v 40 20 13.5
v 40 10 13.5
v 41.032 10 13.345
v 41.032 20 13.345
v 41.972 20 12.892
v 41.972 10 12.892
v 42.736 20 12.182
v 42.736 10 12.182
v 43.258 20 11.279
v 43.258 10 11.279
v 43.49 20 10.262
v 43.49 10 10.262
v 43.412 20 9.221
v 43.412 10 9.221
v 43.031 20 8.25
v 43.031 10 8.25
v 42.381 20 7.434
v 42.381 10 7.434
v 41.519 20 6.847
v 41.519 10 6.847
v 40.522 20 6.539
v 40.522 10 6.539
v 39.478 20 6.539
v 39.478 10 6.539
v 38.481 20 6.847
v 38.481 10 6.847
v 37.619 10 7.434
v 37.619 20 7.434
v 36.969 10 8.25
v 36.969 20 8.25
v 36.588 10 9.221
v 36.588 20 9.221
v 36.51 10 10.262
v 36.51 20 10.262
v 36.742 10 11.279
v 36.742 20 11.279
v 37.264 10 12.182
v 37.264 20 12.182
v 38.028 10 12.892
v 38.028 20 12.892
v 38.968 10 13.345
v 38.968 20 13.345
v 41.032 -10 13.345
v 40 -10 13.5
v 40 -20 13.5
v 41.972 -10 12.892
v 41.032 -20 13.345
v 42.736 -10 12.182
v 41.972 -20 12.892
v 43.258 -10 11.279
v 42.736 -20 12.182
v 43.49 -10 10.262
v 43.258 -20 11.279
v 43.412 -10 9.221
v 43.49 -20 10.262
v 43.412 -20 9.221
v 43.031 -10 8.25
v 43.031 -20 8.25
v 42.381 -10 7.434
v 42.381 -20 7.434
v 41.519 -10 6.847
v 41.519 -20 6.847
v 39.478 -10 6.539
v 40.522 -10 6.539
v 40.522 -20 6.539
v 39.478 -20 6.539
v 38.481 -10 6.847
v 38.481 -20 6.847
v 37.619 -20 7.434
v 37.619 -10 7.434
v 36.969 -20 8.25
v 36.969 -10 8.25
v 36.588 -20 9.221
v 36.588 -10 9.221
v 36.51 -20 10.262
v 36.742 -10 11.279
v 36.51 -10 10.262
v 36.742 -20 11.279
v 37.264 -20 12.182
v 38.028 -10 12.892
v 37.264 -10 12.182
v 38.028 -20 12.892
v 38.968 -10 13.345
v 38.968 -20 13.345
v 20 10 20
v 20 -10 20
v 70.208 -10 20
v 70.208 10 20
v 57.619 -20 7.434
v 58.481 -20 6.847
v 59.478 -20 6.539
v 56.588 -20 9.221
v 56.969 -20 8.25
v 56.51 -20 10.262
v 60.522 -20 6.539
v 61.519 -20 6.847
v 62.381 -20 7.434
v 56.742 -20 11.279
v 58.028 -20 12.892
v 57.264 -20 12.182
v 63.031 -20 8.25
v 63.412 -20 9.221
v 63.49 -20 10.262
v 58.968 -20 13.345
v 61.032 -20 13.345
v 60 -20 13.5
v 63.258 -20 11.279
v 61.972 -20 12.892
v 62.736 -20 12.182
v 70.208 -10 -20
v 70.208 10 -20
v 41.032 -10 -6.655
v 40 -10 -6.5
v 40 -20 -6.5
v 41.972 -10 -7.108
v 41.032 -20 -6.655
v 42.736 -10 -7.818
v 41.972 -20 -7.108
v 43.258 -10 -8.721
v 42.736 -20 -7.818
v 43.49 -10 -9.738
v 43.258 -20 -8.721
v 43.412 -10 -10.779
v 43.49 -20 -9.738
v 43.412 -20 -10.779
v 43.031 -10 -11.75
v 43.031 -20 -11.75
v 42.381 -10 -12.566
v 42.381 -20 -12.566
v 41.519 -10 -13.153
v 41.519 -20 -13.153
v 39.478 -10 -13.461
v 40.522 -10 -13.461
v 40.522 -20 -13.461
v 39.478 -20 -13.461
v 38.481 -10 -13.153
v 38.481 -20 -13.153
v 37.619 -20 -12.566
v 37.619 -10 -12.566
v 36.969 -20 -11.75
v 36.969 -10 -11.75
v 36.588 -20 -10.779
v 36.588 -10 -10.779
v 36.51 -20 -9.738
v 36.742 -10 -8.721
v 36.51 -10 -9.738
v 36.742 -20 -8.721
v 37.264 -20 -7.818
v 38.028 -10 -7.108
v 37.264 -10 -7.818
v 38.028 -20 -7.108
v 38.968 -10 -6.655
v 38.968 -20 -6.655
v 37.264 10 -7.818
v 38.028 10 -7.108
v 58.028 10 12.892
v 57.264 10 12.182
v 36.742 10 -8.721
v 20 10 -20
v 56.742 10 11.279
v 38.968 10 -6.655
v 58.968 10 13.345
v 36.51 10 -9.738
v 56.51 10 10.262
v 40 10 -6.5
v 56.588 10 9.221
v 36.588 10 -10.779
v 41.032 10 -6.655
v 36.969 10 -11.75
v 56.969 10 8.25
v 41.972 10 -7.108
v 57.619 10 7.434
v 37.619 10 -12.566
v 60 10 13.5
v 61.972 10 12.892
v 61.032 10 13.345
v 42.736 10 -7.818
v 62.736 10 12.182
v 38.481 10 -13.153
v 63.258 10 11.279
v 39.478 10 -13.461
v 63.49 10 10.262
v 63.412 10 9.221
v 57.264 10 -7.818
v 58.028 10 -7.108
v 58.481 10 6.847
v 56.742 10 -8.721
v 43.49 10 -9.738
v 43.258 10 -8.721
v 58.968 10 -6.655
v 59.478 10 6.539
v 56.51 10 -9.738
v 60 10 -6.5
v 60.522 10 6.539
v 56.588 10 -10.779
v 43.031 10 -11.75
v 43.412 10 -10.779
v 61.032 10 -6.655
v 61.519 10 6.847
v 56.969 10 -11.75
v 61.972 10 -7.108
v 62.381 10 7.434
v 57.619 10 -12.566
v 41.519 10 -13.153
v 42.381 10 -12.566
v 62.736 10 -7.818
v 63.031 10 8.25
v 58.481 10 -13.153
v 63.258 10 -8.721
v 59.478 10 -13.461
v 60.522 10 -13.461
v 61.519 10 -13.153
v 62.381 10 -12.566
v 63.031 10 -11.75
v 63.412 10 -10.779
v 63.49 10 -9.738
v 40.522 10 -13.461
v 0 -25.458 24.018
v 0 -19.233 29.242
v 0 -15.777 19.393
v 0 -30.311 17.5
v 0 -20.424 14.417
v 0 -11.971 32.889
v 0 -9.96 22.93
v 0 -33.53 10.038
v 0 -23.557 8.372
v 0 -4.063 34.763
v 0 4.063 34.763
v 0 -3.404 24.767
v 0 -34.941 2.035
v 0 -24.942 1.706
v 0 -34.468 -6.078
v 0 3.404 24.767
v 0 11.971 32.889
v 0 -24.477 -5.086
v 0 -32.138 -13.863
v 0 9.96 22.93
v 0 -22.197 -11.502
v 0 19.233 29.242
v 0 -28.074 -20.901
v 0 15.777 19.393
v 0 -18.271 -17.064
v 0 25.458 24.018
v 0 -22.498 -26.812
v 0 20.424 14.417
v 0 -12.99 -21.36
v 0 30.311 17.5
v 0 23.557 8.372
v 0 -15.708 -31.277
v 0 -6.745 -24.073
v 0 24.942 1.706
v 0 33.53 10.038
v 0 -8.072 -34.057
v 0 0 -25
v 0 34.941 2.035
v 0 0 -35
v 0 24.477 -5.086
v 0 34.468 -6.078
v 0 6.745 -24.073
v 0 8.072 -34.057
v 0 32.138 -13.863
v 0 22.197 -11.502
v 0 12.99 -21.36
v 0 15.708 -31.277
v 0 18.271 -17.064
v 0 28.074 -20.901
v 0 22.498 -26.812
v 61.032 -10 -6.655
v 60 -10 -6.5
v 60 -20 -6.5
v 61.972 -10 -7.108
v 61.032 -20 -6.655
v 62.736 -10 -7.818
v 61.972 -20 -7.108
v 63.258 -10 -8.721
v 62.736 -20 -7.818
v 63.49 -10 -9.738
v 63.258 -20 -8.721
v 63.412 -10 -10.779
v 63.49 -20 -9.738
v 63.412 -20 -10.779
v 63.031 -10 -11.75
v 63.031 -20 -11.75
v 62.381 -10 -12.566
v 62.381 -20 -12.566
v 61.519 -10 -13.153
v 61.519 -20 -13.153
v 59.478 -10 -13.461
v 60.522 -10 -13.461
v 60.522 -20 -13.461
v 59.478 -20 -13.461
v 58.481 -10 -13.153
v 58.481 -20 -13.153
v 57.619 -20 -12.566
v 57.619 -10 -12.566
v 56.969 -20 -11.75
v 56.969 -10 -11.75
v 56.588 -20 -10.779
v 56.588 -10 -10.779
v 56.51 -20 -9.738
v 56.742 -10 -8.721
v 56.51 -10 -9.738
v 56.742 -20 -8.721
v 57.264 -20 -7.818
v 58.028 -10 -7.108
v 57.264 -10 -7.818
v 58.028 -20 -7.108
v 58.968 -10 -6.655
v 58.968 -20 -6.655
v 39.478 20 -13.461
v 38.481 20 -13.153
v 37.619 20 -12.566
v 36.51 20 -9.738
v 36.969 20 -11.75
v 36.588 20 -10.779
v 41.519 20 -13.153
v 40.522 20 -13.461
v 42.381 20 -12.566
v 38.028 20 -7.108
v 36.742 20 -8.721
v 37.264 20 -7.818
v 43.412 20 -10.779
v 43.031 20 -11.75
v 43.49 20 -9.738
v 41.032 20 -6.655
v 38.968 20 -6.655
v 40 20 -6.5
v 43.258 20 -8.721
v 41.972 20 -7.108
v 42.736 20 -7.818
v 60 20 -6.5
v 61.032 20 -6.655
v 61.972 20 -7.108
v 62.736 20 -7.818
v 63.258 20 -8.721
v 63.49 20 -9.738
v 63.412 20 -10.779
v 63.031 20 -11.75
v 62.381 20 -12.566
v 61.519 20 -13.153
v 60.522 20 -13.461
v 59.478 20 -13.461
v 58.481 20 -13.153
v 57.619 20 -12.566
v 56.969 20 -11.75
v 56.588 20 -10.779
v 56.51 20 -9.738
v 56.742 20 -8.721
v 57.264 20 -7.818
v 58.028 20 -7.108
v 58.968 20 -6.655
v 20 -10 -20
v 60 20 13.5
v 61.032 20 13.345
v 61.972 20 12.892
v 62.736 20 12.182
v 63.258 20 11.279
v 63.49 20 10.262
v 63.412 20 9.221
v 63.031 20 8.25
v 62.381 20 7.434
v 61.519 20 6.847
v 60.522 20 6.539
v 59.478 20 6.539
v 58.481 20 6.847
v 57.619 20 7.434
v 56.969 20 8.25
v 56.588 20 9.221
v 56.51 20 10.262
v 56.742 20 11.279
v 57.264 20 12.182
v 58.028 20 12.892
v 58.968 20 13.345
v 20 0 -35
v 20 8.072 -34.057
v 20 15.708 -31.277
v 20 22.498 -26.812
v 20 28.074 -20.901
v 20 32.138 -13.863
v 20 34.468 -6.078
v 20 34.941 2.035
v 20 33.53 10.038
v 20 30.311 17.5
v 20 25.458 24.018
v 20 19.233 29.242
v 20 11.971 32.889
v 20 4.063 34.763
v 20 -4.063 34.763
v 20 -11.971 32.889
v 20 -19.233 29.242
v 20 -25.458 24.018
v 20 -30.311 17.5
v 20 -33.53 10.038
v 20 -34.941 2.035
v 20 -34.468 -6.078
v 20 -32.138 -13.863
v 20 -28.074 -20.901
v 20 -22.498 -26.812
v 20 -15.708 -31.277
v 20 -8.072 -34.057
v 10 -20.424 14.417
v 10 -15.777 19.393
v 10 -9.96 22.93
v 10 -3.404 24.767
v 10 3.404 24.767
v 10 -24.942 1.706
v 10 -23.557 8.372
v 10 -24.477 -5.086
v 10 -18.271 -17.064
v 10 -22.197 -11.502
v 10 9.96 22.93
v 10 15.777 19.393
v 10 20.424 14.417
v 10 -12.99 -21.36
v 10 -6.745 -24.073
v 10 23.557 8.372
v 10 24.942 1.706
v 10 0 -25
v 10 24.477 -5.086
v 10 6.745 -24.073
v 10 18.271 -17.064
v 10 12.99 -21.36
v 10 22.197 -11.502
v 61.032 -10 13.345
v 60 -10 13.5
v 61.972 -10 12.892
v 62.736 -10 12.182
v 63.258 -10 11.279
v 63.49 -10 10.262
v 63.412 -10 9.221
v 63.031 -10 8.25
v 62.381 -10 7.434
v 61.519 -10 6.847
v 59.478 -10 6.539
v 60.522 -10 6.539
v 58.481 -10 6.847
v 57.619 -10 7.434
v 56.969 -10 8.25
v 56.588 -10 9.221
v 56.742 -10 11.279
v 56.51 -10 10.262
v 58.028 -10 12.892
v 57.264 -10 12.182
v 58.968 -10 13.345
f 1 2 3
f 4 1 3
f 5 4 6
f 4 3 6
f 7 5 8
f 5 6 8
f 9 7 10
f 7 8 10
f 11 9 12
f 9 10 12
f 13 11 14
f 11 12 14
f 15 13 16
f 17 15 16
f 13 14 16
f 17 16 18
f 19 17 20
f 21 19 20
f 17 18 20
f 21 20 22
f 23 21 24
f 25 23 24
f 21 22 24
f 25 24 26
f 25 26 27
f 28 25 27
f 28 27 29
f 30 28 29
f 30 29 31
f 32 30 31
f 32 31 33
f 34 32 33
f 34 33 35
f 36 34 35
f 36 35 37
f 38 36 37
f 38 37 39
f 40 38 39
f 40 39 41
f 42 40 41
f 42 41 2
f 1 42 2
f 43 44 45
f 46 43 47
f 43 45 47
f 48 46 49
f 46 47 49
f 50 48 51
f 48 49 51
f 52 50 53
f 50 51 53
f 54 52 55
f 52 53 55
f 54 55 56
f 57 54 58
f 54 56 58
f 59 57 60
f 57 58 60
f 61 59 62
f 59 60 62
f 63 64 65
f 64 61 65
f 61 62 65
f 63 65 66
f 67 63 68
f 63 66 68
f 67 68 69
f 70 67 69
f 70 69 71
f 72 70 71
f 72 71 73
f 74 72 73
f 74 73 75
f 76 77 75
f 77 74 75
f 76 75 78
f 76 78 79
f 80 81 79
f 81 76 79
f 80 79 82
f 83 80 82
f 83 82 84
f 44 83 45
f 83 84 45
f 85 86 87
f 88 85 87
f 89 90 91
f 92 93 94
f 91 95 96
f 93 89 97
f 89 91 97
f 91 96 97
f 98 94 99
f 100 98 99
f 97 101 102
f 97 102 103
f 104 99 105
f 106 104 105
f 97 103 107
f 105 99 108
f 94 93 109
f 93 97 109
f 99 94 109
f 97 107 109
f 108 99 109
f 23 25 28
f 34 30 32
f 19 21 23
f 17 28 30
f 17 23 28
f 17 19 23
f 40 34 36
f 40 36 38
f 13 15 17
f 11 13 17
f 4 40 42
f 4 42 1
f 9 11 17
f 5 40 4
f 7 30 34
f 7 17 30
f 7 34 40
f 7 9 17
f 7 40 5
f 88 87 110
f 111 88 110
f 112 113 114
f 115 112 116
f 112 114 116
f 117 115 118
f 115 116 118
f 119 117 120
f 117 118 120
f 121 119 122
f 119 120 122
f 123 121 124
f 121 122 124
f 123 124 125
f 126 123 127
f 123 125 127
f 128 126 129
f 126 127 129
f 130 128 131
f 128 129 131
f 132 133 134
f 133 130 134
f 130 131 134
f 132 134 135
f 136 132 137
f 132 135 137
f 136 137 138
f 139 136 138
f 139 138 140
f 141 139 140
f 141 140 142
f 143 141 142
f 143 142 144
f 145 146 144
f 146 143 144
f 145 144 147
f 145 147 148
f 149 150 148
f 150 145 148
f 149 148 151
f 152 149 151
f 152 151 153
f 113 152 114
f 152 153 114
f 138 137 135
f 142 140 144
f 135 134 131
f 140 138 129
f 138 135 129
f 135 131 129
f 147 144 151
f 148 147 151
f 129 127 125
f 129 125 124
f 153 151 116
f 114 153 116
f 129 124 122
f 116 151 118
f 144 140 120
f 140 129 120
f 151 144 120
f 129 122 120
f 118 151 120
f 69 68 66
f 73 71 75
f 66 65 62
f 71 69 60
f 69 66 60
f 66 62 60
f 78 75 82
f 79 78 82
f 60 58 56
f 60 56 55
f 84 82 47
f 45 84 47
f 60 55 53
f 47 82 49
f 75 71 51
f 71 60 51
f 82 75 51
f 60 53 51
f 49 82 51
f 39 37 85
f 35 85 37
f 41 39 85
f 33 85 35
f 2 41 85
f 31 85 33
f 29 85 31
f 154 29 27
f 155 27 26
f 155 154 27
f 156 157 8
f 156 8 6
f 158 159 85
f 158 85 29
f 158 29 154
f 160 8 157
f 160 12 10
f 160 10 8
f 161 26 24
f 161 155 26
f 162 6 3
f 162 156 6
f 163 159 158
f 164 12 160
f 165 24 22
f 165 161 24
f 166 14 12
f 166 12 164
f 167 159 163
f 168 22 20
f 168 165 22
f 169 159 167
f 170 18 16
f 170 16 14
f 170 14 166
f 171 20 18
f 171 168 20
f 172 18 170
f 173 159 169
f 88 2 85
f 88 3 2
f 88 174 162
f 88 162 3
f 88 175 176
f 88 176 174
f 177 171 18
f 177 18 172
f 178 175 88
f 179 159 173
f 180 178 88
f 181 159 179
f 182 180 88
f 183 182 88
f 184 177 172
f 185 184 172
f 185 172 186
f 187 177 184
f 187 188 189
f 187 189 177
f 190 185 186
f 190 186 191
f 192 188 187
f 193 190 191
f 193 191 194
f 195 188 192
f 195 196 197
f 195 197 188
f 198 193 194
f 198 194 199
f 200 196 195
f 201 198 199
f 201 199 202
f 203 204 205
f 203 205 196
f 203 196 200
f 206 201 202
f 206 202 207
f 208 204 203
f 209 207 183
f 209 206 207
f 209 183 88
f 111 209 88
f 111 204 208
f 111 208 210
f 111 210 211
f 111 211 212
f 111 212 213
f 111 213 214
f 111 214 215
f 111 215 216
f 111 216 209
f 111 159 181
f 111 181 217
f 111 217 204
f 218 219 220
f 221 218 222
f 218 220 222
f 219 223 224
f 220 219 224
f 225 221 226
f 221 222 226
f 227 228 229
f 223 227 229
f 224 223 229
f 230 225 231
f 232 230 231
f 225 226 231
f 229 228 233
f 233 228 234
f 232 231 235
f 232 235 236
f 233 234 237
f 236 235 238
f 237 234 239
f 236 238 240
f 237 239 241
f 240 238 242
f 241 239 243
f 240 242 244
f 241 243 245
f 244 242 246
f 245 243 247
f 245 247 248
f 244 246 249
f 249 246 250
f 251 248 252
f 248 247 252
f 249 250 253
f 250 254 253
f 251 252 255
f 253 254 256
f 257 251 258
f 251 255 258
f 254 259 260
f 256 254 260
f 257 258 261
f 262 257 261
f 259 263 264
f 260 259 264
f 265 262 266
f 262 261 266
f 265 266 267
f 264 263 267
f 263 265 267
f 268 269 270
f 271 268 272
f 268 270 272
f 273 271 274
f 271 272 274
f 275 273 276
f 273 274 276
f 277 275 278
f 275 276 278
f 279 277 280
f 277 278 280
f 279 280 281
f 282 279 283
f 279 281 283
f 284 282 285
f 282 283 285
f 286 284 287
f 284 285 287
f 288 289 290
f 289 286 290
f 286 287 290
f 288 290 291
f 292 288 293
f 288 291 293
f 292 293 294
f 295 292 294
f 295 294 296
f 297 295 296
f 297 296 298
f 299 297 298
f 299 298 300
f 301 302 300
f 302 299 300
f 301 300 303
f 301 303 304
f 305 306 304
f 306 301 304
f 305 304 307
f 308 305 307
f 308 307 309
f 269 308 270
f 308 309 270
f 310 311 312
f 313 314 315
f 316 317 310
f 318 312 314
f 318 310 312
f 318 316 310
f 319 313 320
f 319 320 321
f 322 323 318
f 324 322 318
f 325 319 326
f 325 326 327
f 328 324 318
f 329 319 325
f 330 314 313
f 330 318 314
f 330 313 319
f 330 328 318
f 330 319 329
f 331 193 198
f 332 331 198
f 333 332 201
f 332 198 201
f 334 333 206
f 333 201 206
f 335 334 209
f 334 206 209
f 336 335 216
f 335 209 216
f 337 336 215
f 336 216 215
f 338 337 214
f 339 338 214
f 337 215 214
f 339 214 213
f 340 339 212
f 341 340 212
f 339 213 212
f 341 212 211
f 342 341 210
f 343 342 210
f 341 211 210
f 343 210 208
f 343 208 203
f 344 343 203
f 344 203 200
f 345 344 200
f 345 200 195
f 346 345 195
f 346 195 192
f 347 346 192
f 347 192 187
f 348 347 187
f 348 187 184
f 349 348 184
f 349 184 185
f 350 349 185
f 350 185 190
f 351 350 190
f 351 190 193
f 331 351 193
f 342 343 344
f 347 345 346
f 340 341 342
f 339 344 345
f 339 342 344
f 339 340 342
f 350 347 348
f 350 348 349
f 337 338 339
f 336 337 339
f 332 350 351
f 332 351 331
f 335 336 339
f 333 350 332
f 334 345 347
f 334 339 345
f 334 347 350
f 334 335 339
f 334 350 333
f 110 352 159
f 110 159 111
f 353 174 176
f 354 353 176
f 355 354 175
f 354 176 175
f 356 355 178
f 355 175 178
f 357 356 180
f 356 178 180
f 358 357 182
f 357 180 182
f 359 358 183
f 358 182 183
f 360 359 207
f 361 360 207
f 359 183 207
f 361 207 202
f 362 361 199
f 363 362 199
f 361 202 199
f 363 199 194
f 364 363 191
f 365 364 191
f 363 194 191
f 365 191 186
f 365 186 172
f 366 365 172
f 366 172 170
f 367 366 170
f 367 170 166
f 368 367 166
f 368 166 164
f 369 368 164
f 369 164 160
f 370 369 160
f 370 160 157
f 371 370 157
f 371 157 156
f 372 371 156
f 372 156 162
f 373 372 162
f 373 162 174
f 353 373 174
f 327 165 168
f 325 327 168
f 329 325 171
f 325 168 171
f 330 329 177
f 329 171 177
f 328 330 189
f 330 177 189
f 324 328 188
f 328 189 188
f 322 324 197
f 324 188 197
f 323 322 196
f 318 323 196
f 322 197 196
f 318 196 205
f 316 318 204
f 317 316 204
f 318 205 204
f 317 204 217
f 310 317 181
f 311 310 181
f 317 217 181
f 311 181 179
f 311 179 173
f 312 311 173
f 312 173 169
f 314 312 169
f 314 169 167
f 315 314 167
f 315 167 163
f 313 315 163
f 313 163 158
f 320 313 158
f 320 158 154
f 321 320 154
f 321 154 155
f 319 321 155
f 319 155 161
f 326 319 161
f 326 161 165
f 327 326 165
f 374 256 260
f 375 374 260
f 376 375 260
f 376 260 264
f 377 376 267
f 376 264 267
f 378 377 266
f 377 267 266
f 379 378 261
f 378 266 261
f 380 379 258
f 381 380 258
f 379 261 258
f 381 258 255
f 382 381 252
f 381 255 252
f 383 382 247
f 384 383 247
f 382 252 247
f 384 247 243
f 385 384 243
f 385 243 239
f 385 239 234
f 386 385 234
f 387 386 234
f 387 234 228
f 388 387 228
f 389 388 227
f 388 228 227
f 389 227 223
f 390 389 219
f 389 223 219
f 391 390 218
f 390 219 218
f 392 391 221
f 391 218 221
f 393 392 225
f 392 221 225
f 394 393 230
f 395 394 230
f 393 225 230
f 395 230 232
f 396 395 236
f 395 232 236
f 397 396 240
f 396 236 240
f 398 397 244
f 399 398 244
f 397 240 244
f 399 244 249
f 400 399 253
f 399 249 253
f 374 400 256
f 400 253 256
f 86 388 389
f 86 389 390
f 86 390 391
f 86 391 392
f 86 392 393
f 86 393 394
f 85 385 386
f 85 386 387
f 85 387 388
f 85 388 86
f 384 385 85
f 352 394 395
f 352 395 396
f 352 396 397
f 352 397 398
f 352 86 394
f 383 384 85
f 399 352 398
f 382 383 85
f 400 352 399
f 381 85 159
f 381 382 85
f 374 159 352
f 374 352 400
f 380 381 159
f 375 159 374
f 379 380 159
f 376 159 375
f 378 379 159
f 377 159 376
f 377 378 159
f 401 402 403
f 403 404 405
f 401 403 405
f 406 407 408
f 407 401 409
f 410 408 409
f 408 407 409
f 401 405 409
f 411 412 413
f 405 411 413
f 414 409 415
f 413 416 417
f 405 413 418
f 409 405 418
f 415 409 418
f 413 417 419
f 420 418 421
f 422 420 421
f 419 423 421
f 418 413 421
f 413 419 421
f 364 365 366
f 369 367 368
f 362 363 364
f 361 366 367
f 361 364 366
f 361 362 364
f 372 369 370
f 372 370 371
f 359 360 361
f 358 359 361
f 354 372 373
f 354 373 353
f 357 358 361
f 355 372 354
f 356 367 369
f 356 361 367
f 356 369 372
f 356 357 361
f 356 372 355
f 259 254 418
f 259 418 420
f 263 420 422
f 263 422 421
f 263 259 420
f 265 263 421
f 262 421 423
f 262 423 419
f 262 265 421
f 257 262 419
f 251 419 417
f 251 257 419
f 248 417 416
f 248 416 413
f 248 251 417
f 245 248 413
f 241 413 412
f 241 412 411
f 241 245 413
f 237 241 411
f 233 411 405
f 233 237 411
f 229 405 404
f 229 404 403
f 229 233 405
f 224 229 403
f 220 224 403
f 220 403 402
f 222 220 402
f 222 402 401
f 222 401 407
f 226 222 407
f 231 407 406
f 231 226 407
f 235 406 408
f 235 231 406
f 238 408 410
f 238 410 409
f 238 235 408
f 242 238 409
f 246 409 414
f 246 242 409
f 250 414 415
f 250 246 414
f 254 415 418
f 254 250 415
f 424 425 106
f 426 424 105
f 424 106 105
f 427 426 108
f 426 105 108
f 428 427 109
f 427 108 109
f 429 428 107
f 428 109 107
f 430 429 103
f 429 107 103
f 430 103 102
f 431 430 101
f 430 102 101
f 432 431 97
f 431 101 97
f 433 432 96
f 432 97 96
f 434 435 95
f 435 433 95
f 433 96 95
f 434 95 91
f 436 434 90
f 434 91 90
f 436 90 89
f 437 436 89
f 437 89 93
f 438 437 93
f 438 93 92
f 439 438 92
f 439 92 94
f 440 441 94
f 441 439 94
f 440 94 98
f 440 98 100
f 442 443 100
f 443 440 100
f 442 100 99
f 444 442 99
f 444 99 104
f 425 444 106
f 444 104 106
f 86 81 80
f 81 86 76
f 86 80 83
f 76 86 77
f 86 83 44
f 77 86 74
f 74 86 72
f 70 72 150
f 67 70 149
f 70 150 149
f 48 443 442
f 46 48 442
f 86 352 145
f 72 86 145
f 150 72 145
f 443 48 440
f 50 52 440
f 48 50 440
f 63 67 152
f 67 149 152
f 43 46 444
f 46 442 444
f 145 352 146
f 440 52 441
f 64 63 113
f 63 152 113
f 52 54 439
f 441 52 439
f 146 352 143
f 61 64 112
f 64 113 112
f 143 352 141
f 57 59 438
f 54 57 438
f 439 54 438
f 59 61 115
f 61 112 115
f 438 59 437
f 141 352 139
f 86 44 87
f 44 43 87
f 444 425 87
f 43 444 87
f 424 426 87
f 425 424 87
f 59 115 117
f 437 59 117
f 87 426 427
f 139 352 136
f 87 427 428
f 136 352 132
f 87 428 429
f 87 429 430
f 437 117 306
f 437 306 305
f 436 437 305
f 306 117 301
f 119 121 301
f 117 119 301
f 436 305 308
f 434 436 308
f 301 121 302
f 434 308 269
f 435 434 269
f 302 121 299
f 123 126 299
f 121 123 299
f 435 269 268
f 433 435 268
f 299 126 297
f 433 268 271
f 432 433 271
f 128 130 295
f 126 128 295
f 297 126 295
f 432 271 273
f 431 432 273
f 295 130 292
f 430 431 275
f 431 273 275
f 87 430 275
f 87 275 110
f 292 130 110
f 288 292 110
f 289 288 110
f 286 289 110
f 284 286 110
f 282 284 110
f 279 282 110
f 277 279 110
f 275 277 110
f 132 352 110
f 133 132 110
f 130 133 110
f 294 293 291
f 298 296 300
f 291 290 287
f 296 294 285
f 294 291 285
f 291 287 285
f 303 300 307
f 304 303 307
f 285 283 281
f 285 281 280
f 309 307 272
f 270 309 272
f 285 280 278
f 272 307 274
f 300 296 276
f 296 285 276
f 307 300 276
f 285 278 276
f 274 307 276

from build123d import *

# Parameters (mm, degrees)
SKETCH1_R                = 35
BOSS_EXTRUDE1_DEPTH      = 20
SKETCH2_R                = 25
CUT_EXTRUDE1_DEPTH       = 10
BOSS_EXTRUDE2_DEPTH      = 10
BOSS_EXTRUDE2_DEPTH_BACK = 10
SKETCH3_W                = 70
SKETCH3_H                = 40
BOSS_EXTRUDE3_DEPTH      = 20
BOSS_EXTRUDE3_DEPTH_BACK = 20
SKETCH5_R                = 3.5
CUT_EXTRUDE2_START       = 27
SKETCH6_R                = 25
CUT_EXTRUDE2_DEPTH       = 27


with BuildPart() as part:
    # Sketch1 → Boss-Extrude1 (new body)
    with BuildSketch(Plane(origin=(0, 0, 0), x_dir=(0, 0, -1), z_dir=(1, 0, 0))):
        Circle(SKETCH1_R)
    extrude(amount=BOSS_EXTRUDE1_DEPTH)

    # Sketch2 → Cut-Extrude1 (cut)
    with BuildSketch(Plane(origin=(0, 0, 0), x_dir=(0, 0, -1), z_dir=(1, 0, 0))):
        Circle(SKETCH2_R)
    extrude(amount=CUT_EXTRUDE1_DEPTH, mode=Mode.SUBTRACT)

    # Sketch3 → Boss-Extrude2 (add, two sides: drawn at the far end of the back side and taken through both)
    with BuildSketch(Plane(origin=(0, 0, 0), x_dir=(1, 0, 0), z_dir=(0, 1, 0)).offset(-BOSS_EXTRUDE2_DEPTH_BACK)):
        with Locations((35.208452682, 0)):
            Rectangle(SKETCH3_W, SKETCH3_H)
    extrude(amount=BOSS_EXTRUDE2_DEPTH + BOSS_EXTRUDE2_DEPTH_BACK)

    # Sketch5 → Boss-Extrude3 (add, two sides: drawn at the far end of the back side and taken through both)
    with BuildSketch(Plane(origin=(0, 0, 0), x_dir=(1, 0, 0), z_dir=(0, 1, 0)).offset(-BOSS_EXTRUDE3_DEPTH_BACK)):
        with Locations((40, -10)):
            Circle(SKETCH5_R)
        with Locations((40, 10)):
            Circle(SKETCH5_R)
        with Locations((60, 10)):
            Circle(SKETCH5_R)
        with Locations((60, -10)):
            Circle(SKETCH5_R)
    extrude(amount=BOSS_EXTRUDE3_DEPTH + BOSS_EXTRUDE3_DEPTH_BACK)

    # Sketch6 → Cut-Extrude2 (cut)
    with BuildSketch(Plane.ZY.offset(-10).offset(CUT_EXTRUDE2_START)):
        Circle(SKETCH6_R)
    extrude(amount=-CUT_EXTRUDE2_DEPTH, mode=Mode.SUBTRACT)


solid = part.part
